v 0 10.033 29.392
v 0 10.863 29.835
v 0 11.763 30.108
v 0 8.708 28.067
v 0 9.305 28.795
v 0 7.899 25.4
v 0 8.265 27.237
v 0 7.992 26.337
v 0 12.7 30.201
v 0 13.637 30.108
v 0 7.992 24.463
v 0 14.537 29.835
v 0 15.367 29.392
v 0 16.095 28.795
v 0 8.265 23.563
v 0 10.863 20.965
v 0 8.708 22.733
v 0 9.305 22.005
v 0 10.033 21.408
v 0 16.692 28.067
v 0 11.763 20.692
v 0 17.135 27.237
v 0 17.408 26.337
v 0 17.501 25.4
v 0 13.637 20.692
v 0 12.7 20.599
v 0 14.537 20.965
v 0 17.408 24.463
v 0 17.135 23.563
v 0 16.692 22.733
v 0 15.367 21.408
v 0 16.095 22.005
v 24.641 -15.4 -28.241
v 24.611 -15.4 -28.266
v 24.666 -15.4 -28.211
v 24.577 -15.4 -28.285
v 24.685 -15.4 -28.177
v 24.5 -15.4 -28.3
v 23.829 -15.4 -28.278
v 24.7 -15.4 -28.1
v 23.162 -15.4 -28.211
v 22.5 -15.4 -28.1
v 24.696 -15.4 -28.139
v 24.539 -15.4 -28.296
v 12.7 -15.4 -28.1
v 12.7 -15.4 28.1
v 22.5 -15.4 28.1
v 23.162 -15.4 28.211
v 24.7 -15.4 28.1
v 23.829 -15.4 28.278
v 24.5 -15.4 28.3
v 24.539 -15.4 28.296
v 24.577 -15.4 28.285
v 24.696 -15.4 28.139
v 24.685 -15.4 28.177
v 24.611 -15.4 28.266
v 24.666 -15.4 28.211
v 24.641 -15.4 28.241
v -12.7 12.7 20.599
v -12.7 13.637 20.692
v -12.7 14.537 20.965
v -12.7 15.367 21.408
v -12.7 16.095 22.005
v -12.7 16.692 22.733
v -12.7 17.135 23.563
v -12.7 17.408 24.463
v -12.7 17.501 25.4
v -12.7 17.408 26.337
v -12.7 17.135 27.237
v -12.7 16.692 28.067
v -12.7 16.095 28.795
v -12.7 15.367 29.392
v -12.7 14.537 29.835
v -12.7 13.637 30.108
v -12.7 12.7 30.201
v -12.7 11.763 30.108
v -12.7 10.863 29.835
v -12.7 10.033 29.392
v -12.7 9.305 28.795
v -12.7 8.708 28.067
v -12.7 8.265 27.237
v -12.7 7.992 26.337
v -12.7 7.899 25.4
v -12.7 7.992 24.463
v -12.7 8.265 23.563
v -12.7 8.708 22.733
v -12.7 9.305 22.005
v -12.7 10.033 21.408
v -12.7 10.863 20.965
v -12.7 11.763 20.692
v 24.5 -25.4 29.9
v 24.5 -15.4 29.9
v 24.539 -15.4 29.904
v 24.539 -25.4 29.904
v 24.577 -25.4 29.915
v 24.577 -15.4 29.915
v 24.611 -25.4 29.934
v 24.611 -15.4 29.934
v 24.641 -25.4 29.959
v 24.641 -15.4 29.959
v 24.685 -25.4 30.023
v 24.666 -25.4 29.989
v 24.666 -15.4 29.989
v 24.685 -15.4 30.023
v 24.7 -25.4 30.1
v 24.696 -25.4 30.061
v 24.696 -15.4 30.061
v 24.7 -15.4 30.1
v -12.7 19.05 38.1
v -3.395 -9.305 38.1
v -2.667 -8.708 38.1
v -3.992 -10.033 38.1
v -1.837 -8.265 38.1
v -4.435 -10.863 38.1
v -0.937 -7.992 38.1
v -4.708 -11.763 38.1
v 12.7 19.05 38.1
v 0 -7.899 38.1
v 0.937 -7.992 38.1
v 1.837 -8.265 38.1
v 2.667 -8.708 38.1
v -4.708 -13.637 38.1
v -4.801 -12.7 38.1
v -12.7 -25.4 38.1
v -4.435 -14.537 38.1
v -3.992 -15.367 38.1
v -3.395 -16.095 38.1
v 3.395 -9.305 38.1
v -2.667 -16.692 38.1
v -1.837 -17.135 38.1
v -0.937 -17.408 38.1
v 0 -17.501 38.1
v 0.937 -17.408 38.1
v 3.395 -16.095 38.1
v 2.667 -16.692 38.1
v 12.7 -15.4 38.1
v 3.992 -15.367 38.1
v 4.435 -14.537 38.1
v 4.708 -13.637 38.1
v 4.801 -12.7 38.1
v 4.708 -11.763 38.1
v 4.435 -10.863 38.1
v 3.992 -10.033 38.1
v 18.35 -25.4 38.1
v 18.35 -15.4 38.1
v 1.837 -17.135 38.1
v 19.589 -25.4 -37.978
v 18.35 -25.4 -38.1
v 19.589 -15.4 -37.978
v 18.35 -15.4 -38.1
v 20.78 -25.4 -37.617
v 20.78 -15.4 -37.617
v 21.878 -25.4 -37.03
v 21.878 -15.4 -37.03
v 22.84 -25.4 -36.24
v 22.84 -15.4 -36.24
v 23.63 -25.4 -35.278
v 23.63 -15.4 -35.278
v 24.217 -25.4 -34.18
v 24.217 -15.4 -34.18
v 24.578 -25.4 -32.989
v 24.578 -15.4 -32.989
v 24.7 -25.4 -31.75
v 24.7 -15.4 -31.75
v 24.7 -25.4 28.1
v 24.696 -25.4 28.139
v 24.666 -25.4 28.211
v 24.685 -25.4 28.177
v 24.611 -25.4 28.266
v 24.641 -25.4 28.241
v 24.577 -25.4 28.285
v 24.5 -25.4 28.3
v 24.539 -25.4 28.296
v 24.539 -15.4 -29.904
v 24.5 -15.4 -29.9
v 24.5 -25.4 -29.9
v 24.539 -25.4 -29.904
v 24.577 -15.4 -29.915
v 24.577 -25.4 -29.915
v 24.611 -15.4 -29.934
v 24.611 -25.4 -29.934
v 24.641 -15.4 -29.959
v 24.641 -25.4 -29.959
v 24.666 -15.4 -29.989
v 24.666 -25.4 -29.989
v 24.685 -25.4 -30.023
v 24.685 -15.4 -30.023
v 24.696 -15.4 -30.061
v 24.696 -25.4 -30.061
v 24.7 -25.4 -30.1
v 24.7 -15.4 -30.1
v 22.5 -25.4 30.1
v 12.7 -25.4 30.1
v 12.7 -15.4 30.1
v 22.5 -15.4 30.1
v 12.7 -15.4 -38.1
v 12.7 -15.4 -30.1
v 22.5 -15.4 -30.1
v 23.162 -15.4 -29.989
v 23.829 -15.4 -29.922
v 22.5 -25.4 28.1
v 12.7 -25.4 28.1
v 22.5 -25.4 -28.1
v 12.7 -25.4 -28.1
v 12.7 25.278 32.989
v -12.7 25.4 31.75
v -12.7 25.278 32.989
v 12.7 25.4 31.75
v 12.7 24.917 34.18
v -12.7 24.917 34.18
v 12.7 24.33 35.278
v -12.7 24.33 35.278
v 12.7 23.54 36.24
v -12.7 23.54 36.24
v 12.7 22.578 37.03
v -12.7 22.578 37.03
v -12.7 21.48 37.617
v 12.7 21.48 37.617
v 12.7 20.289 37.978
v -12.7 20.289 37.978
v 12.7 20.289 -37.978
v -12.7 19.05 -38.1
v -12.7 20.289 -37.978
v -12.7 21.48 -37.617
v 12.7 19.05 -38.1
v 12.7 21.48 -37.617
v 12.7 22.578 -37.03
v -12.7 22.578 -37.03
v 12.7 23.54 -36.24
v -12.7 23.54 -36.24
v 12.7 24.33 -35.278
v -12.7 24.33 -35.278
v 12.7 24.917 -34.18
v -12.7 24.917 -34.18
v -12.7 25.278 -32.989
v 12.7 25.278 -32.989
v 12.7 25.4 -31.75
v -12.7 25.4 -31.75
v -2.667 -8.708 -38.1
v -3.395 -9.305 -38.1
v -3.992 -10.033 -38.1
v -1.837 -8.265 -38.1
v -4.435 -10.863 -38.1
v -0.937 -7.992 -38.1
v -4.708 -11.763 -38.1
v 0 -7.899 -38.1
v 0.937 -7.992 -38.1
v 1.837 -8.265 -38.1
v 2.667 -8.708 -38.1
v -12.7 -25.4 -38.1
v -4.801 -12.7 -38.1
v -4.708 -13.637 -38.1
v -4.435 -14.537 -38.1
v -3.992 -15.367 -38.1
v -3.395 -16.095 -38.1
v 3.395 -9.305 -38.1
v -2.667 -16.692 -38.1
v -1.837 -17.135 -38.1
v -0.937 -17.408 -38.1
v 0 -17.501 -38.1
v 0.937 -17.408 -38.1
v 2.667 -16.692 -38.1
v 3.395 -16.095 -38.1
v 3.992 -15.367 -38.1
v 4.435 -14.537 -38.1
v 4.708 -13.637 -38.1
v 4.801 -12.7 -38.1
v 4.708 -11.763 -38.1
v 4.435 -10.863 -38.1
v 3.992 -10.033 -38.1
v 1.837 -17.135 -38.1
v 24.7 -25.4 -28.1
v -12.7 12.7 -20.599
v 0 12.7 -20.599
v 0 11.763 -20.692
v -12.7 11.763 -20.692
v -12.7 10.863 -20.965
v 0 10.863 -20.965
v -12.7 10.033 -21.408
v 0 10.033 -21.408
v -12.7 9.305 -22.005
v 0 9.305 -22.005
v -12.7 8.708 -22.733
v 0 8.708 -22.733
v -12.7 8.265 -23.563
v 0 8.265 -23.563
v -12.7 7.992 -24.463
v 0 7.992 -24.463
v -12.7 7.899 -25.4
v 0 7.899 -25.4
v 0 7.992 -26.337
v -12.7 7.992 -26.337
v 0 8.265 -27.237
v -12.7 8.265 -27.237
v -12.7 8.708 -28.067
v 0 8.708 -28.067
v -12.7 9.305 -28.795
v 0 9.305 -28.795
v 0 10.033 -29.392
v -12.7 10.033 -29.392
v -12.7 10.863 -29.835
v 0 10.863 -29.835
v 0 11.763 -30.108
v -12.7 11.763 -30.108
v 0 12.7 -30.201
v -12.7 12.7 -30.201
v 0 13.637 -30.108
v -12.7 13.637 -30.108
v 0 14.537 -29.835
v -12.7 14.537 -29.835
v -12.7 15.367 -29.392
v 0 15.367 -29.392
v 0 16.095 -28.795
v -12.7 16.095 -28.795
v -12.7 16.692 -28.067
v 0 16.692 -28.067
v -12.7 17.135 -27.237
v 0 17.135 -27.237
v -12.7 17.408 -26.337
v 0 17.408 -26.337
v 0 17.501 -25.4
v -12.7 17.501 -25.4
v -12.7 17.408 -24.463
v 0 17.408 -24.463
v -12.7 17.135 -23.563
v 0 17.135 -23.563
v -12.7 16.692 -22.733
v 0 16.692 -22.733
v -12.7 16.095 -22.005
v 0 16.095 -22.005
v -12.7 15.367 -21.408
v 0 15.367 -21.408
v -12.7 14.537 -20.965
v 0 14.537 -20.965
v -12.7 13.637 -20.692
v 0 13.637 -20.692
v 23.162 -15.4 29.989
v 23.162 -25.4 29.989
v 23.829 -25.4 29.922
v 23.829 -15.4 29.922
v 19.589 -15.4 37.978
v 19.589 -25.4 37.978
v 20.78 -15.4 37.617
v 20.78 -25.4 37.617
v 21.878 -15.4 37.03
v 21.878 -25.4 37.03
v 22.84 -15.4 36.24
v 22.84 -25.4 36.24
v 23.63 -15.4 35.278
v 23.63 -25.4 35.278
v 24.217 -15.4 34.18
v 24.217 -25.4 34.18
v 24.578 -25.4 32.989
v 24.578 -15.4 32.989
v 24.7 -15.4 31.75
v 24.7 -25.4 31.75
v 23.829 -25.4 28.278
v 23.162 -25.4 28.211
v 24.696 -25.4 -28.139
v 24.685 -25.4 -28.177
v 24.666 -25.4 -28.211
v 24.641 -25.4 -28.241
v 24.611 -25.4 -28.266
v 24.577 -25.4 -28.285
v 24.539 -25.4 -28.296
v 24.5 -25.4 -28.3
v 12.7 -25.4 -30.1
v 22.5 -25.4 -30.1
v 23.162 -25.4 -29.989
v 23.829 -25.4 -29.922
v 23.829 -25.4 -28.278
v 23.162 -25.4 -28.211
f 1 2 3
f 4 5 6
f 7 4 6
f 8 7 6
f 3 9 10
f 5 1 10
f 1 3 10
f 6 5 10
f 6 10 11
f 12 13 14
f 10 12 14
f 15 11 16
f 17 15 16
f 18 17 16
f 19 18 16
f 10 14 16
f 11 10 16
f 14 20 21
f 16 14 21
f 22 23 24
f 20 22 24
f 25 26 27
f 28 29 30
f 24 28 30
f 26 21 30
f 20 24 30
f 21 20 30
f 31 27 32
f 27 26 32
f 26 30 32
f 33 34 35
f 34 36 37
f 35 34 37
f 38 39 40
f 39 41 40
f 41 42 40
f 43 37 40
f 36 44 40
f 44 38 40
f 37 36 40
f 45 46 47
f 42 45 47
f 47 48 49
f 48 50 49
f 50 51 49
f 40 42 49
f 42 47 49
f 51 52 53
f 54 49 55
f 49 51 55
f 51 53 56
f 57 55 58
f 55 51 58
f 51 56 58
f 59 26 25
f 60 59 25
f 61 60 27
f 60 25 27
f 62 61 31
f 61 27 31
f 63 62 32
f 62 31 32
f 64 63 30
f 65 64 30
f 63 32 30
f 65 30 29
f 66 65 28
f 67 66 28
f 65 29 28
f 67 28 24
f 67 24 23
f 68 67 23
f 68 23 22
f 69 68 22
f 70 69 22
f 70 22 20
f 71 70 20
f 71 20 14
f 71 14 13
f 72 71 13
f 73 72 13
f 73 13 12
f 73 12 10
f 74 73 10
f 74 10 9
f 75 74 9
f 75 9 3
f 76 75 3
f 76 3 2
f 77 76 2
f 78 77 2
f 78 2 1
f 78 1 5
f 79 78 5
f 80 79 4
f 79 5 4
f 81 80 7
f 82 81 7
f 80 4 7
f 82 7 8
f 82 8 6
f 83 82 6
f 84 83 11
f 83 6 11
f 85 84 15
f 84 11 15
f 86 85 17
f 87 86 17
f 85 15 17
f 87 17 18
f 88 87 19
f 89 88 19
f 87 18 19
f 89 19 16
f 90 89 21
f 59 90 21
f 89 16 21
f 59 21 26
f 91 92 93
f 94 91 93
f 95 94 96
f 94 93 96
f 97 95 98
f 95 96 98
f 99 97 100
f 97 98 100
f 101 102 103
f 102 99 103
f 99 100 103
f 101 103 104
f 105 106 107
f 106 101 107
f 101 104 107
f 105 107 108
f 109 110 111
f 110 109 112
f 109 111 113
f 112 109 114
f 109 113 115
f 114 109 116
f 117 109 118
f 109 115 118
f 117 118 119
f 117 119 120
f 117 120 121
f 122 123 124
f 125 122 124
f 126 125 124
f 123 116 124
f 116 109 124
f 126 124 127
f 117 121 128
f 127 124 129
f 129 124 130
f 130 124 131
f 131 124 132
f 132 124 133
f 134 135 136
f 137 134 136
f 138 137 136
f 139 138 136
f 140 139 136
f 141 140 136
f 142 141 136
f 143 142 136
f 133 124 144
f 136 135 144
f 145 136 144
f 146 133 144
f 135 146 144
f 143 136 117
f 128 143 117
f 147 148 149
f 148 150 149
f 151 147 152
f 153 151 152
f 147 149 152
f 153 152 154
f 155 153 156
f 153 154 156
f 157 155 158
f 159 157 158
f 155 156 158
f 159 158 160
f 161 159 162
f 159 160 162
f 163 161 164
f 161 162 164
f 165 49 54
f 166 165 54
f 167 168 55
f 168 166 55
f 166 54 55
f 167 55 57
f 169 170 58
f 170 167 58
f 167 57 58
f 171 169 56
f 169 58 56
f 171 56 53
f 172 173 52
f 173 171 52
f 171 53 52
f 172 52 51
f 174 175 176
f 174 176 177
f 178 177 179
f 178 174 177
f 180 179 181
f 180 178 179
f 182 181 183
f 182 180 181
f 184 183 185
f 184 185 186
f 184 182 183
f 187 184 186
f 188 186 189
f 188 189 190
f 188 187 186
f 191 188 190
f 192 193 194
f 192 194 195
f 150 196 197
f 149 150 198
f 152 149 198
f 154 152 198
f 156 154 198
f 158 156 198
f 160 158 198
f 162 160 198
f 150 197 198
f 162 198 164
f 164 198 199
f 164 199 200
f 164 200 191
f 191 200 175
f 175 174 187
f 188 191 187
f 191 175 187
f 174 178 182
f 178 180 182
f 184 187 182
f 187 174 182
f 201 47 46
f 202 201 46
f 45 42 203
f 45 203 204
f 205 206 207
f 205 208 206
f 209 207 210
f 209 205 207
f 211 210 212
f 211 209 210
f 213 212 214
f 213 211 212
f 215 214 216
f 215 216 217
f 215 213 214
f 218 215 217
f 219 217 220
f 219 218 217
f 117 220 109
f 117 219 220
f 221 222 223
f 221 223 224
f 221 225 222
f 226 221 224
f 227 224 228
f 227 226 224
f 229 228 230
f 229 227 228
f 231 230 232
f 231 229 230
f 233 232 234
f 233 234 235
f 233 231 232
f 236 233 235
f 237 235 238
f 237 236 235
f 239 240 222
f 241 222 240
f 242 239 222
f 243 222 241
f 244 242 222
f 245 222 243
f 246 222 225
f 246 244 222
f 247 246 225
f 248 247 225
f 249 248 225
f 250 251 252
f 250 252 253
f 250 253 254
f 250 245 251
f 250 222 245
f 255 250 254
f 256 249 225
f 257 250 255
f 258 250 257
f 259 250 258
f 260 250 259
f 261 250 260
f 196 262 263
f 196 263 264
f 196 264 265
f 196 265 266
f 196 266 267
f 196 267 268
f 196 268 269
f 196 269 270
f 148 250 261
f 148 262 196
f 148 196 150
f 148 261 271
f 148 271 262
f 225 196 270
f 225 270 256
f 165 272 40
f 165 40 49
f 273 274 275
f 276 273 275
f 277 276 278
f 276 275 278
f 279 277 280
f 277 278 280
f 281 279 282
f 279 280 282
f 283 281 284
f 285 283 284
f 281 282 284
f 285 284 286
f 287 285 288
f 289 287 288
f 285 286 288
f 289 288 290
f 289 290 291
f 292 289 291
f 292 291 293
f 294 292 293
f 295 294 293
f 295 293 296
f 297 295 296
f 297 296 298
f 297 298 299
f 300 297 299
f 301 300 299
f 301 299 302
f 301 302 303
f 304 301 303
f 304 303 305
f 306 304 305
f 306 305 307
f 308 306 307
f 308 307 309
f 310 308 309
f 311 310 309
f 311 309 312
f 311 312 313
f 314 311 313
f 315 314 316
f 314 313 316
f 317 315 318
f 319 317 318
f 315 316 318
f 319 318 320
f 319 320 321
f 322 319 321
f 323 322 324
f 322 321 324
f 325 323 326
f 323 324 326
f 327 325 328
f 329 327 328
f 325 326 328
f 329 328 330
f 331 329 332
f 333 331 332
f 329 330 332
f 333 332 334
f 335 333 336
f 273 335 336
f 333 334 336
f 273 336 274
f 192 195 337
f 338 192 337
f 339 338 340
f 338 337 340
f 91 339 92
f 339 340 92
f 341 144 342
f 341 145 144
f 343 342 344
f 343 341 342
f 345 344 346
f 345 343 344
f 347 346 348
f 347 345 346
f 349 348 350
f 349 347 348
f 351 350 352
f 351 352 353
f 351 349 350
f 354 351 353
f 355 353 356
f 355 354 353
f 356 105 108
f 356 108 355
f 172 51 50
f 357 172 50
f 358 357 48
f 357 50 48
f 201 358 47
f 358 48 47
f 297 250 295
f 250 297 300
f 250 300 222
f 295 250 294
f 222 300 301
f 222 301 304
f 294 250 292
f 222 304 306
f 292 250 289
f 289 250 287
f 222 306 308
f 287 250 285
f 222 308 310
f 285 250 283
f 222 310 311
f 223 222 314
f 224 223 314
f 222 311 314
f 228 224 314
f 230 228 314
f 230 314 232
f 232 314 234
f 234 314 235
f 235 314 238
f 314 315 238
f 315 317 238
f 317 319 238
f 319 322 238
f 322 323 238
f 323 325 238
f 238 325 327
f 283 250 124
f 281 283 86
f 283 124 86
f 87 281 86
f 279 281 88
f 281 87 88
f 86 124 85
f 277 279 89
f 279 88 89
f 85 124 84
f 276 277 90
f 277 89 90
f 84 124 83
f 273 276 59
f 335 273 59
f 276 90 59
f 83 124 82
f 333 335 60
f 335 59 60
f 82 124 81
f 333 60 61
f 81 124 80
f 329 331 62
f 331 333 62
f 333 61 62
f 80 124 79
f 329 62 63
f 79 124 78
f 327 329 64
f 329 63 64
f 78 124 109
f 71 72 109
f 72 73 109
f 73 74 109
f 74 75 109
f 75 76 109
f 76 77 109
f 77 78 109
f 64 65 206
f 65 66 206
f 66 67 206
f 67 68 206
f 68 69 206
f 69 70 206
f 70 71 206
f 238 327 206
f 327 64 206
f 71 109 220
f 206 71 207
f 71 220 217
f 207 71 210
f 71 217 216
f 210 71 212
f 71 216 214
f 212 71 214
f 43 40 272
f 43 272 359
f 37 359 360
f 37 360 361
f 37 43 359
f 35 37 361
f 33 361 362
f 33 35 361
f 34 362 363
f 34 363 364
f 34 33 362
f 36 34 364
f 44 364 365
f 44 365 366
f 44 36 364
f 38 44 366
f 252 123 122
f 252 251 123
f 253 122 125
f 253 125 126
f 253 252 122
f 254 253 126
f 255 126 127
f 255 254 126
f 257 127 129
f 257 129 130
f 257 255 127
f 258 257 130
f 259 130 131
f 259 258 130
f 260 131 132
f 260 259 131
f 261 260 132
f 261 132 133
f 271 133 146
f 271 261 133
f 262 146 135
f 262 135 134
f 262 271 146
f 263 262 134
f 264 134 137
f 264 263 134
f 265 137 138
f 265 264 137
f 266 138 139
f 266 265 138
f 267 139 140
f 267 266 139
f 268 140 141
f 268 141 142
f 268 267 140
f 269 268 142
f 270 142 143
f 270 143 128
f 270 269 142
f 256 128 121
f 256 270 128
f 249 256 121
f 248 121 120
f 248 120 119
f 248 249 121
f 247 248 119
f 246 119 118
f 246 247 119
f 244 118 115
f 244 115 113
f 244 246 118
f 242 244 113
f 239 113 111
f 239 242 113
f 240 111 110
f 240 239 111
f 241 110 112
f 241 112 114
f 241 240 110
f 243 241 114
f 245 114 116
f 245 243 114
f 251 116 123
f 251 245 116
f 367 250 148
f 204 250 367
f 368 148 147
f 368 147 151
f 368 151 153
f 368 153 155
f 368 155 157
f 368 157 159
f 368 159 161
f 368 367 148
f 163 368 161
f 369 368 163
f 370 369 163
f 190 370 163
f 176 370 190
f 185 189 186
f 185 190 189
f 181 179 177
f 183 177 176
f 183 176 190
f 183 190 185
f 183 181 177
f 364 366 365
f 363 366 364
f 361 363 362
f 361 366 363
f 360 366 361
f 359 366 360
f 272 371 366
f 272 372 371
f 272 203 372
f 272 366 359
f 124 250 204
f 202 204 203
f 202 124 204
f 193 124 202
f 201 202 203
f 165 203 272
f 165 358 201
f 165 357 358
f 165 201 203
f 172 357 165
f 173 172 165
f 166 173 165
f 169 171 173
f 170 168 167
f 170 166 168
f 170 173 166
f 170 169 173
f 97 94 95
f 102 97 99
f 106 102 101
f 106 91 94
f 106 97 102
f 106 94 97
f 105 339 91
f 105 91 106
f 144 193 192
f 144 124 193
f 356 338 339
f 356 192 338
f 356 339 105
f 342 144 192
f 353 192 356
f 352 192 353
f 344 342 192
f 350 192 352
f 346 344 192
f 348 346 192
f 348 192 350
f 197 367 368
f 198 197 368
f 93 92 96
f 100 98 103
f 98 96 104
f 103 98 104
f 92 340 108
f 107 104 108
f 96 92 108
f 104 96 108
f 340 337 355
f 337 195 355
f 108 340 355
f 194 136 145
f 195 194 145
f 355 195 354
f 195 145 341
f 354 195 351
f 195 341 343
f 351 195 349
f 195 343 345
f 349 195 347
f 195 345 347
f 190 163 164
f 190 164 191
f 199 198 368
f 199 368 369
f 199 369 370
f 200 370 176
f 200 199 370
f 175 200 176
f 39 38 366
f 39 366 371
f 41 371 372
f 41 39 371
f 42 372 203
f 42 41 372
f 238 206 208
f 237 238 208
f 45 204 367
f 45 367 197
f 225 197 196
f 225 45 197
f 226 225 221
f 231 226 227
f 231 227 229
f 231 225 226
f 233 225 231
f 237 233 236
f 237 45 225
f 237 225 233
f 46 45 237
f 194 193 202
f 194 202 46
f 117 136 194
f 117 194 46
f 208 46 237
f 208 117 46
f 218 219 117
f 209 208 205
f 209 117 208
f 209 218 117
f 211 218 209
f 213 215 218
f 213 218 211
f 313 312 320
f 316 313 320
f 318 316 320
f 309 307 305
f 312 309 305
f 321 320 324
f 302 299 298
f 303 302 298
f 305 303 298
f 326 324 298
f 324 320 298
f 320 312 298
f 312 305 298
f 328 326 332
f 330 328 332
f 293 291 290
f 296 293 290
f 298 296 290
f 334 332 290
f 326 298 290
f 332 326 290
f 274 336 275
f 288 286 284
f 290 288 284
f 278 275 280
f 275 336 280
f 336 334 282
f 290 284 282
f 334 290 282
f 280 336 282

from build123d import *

# Parameters (mm, degrees)
SKETCH1_W           = 25.4
SKETCH1_H           = 50.8
SKETCH1_R           = 4.8006
BOSS_EXTRUDE1_DEPTH = 38.1
SKETCH2_R           = 4.8006
CUT_EXTRUDE1_DEPTH  = 48.519048812
SKETCH3_W           = 12
SKETCH3_H           = 76.2
BOSS_EXTRUDE2_DEPTH = 10
CUT_EXTRUDE2_DEPTH  = 53.027492732
FILLET1_R           = 6.35


with BuildPart() as part:
    # Sketch1 → Boss-Extrude1 (new, symmetric)
    with BuildSketch(Plane.XY):
        Rectangle(SKETCH1_W, SKETCH1_H)
        with Locations(Location((0, -12.7, 0), (0, 0, 180))):
            Circle(SKETCH1_R, mode=Mode.SUBTRACT)
    extrude(amount=BOSS_EXTRUDE1_DEPTH, both=True)

    # Sketch2 → Cut-Extrude1 (cut, through all)
    with BuildSketch(Plane(origin=(0, 0, 0), x_dir=(0, 0, -1), z_dir=(1, 0, 0))):
        with Locations((-25.4, 12.7)):
            Circle(SKETCH2_R)
        with Locations(Location((25.4, 12.7, 0), (0, 0, 180))):
            Circle(SKETCH2_R)
    extrude(amount=-CUT_EXTRUDE1_DEPTH, mode=Mode.SUBTRACT)

    # Sketch3 → Boss-Extrude2 (add)
    with BuildSketch(Plane.XZ.offset(25.4)):
        with Locations((18.7, 0)):
            Rectangle(SKETCH3_W, SKETCH3_H)
    extrude(amount=-BOSS_EXTRUDE2_DEPTH)

    # Sketch4 → Cut-Extrude2 (cut, through all)
    with BuildSketch(Plane(origin=(0, 0, 0), x_dir=(1, 0, 0), z_dir=(0, 1, 0))):
        with BuildLine():
            Line((24.7, 30.1), (24.7, 28.1))
            ThreePointArc((24.7, 28.1), (24.641421356, 28.241421356), (24.5, 28.3))
            ThreePointArc((24.5, 28.3), (23.495012438, 28.249875621), (22.5, 28.1))
            Line((22.5, 28.1), (12.7, 28.1))
            Line((12.7, 28.1), (12.7, 30.1))
            Line((12.7, 30.1), (22.5, 30.1))
            ThreePointArc((22.5, 30.1), (23.495012438, 29.950124379), (24.5, 29.9))
            ThreePointArc((24.5, 29.9), (24.641421356, 29.958578644), (24.7, 30.1))
        make_face()
        with BuildLine():
            Line((24.7, -30.1), (24.7, -28.1))
            ThreePointArc((24.7, -28.1), (24.641421356, -28.241421356), (24.5, -28.3))
            ThreePointArc((24.5, -28.3), (23.495012438, -28.249875621), (22.5, -28.1))
            Line((22.5, -28.1), (12.7, -28.1))
            Line((12.7, -28.1), (12.7, -30.1))
            Line((12.7, -30.1), (22.5, -30.1))
            ThreePointArc((22.5, -30.1), (23.495012438, -29.950124379), (24.5, -29.9))
            ThreePointArc((24.5, -29.9), (24.641421356, -29.958578644), (24.7, -30.1))
        make_face()
    extrude(amount=-CUT_EXTRUDE2_DEPTH, mode=Mode.SUBTRACT)

    # Fillet1
    fillet1_edges = [part.edges().sort_by_distance(p)[0] for p in [
        (24.7, -20.4, 38.1),
        (24.7, -20.4, -38.1),
        (0, 25.4, -38.1),
        (0, 25.4, 38.1),
    ]]
    fillet(fillet1_edges, radius=FILLET1_R)


solid = part.part
